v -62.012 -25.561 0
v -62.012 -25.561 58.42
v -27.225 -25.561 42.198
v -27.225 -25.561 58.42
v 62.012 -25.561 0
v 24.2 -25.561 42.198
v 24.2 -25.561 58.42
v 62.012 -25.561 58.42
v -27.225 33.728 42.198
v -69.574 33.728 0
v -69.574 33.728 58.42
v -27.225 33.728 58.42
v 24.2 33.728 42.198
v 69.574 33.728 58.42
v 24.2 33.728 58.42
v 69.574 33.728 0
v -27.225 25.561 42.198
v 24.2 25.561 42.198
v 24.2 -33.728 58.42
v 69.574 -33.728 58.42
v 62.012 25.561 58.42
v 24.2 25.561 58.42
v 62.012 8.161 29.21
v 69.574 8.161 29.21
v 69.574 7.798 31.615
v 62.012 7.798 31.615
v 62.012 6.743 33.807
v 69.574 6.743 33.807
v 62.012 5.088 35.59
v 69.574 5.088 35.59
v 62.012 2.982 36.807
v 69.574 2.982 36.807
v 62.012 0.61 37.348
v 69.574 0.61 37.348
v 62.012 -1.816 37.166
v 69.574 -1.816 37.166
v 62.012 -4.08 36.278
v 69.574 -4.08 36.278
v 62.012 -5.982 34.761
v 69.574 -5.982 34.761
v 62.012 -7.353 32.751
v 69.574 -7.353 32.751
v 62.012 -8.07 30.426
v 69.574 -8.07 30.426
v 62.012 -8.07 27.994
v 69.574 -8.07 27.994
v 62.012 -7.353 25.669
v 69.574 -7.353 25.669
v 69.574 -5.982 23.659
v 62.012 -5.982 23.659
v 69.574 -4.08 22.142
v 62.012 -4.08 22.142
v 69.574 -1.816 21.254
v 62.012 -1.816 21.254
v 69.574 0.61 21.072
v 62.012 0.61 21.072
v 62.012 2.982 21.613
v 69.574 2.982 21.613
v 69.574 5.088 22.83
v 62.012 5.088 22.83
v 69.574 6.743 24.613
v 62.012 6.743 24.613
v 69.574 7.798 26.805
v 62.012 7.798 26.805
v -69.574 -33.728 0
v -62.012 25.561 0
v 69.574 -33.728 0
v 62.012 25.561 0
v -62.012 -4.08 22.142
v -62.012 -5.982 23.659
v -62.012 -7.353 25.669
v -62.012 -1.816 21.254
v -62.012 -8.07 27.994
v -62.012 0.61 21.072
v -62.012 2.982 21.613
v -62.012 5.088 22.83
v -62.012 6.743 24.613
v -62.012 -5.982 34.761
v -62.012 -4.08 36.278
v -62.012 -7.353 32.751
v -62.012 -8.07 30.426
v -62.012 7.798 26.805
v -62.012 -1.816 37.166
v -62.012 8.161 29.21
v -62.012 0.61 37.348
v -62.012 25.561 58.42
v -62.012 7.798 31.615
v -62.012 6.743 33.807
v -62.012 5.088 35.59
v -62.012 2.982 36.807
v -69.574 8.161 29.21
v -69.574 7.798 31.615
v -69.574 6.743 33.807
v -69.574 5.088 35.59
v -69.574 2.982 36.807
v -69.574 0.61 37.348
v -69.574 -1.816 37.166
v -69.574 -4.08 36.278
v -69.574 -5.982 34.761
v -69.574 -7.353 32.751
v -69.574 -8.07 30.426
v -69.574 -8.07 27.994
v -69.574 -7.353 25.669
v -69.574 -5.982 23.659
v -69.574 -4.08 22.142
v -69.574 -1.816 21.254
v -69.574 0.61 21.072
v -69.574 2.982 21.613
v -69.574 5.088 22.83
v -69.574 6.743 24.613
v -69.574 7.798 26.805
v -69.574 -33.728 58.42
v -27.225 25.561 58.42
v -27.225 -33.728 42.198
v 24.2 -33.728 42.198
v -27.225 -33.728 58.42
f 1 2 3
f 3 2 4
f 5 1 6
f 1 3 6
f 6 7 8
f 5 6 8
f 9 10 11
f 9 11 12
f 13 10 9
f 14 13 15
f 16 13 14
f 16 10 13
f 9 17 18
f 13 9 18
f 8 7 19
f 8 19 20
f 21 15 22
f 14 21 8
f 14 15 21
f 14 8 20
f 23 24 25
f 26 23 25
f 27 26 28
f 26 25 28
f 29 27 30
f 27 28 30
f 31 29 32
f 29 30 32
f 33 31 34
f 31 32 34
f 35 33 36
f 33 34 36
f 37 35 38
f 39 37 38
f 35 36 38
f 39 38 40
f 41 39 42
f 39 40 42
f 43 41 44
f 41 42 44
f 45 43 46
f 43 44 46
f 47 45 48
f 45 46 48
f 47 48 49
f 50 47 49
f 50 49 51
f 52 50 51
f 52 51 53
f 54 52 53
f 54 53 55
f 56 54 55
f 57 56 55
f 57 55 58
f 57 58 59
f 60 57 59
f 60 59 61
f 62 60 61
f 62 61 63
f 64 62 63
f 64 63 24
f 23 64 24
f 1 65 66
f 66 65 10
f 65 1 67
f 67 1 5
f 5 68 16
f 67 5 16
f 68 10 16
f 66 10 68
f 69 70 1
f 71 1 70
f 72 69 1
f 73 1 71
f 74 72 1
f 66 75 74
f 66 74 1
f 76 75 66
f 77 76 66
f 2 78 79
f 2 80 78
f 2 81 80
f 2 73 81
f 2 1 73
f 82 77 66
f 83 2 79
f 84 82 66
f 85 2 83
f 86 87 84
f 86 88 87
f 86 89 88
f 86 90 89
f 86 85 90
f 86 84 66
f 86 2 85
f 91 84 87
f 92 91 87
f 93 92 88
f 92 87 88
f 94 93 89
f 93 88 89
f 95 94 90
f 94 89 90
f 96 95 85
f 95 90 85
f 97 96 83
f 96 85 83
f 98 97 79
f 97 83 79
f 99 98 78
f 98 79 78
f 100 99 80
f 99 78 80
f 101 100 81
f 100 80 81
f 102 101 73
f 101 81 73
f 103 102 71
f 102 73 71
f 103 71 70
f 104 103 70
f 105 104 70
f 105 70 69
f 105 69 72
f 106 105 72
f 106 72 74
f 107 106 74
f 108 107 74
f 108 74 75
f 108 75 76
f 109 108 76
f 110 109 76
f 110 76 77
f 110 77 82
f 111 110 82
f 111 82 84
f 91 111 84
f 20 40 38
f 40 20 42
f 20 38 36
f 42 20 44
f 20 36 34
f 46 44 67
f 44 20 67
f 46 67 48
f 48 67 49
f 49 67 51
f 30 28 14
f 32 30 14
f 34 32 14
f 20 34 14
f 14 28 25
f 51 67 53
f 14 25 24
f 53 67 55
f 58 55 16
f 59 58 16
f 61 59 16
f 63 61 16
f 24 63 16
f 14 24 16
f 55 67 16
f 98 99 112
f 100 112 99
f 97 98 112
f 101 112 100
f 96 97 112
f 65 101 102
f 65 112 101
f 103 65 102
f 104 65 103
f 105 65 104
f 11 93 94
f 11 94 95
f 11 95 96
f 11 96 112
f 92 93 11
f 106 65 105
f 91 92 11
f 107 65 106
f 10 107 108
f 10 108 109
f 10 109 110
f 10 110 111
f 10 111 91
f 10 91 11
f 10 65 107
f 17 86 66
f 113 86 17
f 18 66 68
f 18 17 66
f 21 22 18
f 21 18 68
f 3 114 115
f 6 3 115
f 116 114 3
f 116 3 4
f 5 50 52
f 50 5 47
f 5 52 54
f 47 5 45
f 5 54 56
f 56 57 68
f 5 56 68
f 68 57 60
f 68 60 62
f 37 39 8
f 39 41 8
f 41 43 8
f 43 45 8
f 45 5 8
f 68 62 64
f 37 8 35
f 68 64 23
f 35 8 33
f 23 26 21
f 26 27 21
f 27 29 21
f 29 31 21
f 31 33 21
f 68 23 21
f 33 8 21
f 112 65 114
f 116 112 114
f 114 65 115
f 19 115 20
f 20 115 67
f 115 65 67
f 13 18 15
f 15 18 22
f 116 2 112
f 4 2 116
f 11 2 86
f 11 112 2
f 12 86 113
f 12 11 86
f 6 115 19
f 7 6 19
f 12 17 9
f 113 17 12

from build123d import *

# Parameters (mm, degrees)
F0_W     = 139.147832
F0_H     = 67.456446
F1_DEPTH = 58.42
F2_R     = 8.160902
F3_DEPTH = 139.148833
F4_W     = 124.023072
F4_H     = 51.121704
F5_DEPTH = 58.421
F6_W     = 51.424196
F6_H     = 16.221908
F7_DEPTH = 67.457447


with BuildPart() as f1:
    # F0 (on Top) → F1 (new body)
    with BuildSketch(Plane.XY):
        Rectangle(F0_W, F0_H)
    extrude(amount=F1_DEPTH)

    # F2 (on face) → F3 (cut, through all)
    with BuildSketch(Plane.YZ.offset(69.573916)):
        with Locations((0, 29.21)):
            Circle(F2_R)
    extrude(amount=-F3_DEPTH, mode=Mode.SUBTRACT)

    # F4 (on face) → F5 (cut, through all)
    with BuildSketch(Plane.XY.offset(58.42)):
        Rectangle(F4_W, F4_H)
    extrude(amount=-F5_DEPTH, mode=Mode.SUBTRACT)

    # F6 (on face) → F7 (cut, through all)
    with BuildSketch(Plane.XZ.offset(33.728223)):
        with Locations((-1.512476, 50.309046)):
            Rectangle(F6_W, F6_H)
    extrude(amount=-F7_DEPTH, mode=Mode.SUBTRACT)


solid = f1.part
